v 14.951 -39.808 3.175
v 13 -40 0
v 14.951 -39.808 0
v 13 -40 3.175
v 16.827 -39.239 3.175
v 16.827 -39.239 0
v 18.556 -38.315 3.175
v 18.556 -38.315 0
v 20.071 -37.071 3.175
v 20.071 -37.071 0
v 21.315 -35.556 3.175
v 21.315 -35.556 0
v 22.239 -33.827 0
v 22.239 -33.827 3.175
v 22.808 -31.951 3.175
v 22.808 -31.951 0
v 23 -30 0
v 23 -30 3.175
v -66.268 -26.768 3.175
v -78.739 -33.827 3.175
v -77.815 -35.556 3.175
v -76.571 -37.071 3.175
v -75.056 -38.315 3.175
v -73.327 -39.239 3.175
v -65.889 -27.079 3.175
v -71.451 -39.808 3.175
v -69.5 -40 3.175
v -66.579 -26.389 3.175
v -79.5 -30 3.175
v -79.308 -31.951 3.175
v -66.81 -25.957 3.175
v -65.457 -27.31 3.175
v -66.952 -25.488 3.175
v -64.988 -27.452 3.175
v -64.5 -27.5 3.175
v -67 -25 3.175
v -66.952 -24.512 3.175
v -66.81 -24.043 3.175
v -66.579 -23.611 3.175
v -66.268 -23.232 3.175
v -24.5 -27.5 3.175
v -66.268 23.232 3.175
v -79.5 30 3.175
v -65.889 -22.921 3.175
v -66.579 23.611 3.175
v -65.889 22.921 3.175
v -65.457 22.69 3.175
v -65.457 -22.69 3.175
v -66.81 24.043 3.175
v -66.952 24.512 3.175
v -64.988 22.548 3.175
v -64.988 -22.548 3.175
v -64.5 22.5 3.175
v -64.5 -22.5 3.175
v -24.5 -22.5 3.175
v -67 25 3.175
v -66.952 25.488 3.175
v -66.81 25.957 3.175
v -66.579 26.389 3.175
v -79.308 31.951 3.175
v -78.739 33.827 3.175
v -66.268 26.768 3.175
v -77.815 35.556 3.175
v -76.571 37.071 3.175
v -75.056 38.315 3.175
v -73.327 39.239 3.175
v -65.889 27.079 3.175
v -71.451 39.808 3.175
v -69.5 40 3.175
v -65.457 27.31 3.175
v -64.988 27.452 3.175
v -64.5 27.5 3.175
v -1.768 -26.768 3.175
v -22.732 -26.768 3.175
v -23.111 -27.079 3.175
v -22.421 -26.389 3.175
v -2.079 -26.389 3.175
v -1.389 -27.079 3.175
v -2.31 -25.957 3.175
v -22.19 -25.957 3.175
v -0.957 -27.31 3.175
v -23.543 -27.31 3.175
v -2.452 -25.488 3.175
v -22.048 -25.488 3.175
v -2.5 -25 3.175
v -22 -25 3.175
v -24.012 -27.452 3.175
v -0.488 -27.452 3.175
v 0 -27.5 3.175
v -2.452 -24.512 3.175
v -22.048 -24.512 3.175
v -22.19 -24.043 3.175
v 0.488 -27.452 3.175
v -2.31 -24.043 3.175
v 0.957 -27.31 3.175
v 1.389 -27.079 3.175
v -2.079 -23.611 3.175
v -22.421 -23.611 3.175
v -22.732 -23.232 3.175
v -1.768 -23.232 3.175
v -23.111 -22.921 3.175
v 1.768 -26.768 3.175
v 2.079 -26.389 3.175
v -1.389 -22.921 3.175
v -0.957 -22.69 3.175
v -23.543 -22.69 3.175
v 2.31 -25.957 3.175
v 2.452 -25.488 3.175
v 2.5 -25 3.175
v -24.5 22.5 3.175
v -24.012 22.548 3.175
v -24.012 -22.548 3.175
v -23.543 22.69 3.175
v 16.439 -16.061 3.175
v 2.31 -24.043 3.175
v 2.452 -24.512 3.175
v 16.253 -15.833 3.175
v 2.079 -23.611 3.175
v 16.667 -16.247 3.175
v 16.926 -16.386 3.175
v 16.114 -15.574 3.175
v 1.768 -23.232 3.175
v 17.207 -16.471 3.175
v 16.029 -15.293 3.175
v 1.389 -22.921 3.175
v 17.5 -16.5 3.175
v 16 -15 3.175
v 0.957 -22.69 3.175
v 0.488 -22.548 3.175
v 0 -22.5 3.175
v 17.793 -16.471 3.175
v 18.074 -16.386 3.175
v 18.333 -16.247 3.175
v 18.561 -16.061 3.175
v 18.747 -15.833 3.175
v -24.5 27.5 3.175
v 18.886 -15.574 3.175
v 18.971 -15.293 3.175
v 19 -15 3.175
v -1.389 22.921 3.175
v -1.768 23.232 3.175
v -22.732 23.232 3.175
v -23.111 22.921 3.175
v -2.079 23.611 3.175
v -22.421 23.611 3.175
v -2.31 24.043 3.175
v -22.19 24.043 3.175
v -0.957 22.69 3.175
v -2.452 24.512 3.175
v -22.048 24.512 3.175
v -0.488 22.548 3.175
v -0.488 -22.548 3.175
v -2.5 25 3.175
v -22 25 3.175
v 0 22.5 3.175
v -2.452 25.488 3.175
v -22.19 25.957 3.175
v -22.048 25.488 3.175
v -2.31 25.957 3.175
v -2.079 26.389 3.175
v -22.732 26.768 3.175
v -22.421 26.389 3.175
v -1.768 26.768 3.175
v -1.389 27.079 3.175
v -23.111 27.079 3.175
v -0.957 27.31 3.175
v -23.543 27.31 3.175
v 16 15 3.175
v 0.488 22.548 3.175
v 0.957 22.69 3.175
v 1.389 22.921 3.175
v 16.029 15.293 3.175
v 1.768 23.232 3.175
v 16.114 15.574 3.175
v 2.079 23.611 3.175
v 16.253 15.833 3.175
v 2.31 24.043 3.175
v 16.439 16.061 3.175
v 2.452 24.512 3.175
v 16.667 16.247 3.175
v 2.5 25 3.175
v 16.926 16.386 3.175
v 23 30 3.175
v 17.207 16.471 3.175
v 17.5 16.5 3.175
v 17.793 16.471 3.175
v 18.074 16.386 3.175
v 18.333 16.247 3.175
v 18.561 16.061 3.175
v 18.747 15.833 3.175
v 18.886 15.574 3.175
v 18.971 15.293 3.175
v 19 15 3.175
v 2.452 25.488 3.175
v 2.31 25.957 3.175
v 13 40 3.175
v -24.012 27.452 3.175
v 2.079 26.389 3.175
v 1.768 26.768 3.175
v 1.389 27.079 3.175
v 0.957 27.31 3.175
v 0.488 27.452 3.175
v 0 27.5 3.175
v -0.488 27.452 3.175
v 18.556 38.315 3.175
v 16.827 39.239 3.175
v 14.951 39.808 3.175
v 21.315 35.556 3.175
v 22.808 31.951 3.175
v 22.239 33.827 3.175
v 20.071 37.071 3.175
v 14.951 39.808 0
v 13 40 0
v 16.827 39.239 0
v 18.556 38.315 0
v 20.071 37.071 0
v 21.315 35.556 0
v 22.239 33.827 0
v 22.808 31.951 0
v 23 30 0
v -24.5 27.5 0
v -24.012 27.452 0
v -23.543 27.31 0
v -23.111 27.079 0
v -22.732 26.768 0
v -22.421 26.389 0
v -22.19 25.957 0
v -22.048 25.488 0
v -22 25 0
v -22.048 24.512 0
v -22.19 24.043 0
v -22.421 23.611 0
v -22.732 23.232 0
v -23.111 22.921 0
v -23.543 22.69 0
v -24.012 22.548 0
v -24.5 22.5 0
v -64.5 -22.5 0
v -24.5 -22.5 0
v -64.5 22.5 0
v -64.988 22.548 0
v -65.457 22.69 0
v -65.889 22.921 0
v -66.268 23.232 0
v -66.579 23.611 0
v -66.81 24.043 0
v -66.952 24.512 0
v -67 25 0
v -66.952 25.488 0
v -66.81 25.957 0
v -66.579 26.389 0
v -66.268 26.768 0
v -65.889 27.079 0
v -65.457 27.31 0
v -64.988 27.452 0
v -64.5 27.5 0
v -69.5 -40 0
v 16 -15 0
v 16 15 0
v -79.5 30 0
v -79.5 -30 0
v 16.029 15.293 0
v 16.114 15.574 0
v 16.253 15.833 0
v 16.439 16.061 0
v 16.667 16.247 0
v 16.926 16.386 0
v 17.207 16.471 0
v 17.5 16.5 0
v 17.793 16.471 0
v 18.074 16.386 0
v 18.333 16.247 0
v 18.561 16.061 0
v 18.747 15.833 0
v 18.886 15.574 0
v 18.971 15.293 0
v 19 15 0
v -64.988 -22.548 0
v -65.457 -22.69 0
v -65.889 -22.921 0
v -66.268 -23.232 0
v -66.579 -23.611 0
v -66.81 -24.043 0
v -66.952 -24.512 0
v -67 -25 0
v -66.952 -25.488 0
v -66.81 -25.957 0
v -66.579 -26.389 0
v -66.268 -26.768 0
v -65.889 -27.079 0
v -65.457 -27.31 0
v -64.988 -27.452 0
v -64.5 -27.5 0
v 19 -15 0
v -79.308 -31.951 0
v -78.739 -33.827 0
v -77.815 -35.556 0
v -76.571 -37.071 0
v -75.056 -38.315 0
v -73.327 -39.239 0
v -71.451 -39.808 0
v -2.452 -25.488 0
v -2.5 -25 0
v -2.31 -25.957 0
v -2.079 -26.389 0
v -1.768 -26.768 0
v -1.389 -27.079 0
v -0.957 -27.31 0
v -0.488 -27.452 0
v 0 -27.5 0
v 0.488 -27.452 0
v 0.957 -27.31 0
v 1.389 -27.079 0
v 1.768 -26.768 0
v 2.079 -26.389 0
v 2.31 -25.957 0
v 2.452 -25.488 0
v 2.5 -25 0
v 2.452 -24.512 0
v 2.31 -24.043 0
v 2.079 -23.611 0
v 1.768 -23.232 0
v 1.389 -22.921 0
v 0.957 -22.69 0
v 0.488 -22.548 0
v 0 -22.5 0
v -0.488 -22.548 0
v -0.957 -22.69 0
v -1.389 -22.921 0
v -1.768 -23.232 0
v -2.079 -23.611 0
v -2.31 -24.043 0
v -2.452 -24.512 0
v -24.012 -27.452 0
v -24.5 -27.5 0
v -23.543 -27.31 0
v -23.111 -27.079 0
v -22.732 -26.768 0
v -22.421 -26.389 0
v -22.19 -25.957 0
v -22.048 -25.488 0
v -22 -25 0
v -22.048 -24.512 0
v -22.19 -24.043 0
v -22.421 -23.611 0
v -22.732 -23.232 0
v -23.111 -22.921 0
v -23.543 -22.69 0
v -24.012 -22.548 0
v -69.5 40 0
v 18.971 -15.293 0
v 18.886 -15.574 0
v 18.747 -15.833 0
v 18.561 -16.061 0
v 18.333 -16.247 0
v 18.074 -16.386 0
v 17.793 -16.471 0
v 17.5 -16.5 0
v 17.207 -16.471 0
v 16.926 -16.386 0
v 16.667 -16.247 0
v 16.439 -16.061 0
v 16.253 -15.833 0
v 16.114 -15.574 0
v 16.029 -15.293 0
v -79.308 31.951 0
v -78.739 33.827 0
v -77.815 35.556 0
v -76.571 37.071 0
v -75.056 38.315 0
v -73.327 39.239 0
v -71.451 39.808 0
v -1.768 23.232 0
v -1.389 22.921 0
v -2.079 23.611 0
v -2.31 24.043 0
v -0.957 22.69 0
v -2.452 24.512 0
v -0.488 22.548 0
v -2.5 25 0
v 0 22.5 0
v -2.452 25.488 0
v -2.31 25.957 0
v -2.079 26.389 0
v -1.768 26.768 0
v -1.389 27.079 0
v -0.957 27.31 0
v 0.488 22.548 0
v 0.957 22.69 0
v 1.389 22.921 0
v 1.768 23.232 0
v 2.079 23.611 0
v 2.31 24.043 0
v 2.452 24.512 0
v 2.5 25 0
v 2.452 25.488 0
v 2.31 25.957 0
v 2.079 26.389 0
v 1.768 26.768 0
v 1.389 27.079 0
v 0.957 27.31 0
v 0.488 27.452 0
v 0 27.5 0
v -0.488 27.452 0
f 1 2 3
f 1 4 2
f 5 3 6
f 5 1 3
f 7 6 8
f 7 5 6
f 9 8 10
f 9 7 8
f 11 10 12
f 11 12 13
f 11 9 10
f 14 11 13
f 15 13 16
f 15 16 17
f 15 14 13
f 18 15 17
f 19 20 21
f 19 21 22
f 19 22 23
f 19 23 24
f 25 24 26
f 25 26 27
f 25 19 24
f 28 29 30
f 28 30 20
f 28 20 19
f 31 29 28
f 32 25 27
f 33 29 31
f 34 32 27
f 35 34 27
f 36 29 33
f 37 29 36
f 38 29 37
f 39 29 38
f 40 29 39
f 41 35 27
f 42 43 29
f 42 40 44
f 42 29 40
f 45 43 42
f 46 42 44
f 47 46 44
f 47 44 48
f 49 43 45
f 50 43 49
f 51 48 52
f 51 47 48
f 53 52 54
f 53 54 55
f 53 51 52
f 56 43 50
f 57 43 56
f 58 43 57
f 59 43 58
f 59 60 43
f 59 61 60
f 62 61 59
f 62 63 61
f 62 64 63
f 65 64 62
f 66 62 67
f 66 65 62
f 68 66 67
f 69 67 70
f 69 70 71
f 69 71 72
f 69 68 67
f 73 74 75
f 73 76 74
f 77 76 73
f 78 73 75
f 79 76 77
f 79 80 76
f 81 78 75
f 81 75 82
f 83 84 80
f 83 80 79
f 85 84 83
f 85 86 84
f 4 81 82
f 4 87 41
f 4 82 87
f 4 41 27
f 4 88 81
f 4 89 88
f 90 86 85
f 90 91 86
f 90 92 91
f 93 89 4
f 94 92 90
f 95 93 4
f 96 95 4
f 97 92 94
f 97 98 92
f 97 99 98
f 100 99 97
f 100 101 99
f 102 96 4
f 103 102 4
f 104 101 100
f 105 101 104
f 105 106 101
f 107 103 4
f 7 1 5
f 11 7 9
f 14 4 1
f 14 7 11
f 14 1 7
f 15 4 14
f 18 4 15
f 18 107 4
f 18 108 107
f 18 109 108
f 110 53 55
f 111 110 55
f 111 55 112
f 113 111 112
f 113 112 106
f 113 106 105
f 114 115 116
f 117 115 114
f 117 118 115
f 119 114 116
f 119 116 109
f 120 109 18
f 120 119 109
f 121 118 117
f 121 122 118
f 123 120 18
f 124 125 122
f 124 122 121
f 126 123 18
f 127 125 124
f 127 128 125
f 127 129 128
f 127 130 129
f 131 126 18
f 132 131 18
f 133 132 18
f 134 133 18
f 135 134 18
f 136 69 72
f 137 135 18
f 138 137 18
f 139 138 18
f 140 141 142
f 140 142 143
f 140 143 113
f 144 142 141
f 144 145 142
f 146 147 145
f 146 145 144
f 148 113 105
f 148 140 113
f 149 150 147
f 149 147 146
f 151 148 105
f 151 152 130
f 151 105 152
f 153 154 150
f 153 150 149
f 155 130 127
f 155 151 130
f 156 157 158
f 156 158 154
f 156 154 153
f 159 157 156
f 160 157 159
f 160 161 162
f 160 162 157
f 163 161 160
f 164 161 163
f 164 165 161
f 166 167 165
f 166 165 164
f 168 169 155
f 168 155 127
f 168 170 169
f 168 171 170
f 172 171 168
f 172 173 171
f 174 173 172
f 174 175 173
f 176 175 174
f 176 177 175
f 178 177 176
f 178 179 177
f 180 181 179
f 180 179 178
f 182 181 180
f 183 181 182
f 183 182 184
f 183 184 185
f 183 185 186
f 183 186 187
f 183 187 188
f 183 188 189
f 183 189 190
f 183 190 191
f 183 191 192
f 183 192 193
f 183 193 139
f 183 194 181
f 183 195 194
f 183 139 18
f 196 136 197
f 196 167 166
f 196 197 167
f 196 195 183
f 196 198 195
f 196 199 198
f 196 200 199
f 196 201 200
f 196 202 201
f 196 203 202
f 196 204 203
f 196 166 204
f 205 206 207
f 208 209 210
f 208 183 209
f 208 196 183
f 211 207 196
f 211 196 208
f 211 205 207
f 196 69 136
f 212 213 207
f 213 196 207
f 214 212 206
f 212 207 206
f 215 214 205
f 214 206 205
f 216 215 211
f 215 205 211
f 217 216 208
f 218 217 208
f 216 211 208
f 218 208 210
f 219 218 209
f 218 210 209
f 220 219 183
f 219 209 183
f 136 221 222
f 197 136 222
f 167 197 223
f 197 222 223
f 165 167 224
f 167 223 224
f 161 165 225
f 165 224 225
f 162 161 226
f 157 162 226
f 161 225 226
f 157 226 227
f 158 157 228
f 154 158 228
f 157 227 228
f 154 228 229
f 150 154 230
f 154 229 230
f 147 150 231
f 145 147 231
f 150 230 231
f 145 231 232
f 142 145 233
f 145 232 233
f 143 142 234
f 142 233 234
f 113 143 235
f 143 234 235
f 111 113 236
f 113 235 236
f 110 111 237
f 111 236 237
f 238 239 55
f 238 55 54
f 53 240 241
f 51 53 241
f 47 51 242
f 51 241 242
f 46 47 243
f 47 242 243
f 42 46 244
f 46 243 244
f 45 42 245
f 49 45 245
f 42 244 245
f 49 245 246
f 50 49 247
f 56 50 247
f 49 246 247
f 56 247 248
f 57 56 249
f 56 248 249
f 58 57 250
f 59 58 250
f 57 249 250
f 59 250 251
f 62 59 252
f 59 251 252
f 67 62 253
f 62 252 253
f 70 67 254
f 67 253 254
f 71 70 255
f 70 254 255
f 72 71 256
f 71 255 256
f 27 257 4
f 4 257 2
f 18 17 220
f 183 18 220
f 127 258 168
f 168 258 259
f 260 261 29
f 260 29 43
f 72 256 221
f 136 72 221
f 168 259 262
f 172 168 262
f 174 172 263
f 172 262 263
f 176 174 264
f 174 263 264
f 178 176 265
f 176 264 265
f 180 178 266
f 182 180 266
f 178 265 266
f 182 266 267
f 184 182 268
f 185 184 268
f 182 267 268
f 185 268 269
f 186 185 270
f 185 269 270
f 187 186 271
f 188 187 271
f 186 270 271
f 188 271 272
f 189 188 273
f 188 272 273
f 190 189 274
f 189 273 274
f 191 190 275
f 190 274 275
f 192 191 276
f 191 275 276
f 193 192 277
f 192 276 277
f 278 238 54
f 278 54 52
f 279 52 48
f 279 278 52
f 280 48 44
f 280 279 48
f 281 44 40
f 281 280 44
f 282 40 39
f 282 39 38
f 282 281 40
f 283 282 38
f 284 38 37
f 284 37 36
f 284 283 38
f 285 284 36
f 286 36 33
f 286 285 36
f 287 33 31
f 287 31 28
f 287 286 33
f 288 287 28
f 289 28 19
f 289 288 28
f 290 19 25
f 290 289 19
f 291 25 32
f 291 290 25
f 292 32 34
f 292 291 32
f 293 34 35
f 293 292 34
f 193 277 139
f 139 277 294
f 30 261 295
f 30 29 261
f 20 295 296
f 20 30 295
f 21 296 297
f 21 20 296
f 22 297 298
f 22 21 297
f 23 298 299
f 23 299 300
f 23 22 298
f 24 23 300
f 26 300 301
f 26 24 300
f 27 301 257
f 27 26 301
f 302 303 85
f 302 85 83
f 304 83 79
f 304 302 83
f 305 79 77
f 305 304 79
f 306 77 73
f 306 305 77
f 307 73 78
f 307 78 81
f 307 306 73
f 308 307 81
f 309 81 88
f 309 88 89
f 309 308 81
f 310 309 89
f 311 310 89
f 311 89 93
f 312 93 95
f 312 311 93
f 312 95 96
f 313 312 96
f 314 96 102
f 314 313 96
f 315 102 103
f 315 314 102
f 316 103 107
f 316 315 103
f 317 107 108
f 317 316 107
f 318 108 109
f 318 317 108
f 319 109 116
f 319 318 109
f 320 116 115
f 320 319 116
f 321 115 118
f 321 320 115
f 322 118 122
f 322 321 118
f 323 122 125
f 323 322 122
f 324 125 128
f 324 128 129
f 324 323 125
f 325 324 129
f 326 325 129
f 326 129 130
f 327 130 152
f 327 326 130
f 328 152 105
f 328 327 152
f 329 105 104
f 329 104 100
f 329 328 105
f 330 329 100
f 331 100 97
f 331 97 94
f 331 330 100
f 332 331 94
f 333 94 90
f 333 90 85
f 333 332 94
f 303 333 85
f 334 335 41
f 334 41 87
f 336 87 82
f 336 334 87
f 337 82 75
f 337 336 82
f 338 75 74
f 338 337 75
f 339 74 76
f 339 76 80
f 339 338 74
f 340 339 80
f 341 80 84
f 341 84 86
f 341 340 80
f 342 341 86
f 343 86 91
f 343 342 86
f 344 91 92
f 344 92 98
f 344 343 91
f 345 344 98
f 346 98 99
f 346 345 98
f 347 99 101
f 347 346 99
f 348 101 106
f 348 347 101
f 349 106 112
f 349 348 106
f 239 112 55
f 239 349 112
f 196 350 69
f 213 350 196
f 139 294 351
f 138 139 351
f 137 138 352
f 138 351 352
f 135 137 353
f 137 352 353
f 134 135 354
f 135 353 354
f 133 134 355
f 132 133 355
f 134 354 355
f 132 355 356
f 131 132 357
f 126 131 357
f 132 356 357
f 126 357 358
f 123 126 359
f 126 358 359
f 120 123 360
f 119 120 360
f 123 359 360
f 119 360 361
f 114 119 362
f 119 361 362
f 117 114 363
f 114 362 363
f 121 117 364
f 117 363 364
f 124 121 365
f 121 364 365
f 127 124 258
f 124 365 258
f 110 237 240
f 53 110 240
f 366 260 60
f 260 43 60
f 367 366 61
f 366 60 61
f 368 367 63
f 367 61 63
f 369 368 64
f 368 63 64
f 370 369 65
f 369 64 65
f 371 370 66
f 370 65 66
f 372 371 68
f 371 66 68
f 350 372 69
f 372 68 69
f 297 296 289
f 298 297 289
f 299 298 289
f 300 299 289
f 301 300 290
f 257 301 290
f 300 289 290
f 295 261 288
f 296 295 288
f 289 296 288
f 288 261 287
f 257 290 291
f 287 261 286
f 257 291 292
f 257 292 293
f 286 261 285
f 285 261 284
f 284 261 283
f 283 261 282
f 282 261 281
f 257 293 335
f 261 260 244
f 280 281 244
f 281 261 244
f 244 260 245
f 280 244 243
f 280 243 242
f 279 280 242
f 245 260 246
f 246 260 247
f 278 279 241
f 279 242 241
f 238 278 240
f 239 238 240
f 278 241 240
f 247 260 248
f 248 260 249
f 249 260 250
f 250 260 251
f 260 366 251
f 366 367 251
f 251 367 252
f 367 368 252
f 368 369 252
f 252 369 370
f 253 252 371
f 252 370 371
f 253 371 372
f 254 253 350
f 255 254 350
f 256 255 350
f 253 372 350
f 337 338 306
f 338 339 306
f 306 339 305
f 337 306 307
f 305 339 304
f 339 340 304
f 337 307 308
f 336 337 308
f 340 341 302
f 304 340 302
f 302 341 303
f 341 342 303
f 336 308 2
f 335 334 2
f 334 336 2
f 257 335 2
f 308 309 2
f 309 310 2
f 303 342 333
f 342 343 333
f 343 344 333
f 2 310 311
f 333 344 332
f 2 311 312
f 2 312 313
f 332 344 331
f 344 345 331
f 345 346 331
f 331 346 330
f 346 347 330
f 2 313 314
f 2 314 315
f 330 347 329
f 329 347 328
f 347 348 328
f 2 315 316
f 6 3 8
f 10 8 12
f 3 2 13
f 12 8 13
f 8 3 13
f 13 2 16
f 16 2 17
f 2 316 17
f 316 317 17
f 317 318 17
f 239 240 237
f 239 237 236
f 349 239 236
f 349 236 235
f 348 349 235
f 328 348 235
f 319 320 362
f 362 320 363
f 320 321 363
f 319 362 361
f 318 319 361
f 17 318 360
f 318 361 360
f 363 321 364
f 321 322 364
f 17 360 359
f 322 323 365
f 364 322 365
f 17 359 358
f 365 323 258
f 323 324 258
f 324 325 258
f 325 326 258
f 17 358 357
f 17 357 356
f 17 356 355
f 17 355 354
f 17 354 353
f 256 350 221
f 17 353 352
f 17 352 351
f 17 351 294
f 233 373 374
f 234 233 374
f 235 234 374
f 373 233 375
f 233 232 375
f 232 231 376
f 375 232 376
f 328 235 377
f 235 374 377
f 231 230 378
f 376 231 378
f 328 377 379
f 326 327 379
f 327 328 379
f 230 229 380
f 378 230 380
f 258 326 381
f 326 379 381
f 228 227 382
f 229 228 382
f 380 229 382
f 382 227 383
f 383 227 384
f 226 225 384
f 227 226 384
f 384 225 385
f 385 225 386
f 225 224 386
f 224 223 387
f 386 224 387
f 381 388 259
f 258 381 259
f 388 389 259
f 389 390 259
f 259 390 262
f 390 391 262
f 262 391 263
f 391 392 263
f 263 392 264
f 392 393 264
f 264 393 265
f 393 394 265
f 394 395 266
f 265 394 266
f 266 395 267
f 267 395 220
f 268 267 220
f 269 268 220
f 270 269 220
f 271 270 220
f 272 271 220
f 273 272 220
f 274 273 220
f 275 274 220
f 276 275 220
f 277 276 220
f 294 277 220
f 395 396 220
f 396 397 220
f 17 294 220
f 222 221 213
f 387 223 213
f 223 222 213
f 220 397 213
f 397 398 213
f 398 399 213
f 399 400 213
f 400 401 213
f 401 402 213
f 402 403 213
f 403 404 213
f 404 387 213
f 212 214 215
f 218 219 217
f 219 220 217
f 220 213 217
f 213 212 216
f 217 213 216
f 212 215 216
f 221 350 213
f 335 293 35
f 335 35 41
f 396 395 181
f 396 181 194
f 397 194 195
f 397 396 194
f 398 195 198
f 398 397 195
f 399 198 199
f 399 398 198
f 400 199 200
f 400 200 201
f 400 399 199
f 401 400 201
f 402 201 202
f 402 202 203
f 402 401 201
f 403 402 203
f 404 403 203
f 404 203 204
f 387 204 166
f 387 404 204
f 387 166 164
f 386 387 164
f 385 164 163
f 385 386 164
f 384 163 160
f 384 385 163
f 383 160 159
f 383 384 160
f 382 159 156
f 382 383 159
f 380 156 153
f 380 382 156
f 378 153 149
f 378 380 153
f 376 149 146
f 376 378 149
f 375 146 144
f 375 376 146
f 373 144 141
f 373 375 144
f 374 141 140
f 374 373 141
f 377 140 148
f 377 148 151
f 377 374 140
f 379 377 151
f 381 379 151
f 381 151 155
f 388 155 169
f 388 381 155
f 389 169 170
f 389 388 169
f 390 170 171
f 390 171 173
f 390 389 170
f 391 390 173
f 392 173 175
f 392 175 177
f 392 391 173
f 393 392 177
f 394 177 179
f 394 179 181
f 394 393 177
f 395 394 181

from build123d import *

# Parameters (mm, degrees)
SKETCH1_W           = 102.5
SKETCH1_H           = 80
SKETCH1_R           = 2.5
BOSS_EXTRUDE1_DEPTH = 3.175
FILLET1_R           = 10


with BuildPart() as part:
    # Sketch1 → Boss-Extrude1 (new body)
    with BuildSketch(Plane.XY):
        with Locations((-28.25, 0)):
            Rectangle(SKETCH1_W, SKETCH1_H)
        with Locations((0, 25)):
            Circle(SKETCH1_R, mode=Mode.SUBTRACT)
        with Locations(Location((0, -25, 0), (0, 0, 180))):
            Circle(SKETCH1_R, mode=Mode.SUBTRACT)
        with BuildLine():
            Line((-64.5, -27.5), (-24.5, -27.5))
            ThreePointArc((-24.5, -27.5), (-22, -25), (-24.5, -22.5))
            Line((-24.5, -22.5), (-64.5, -22.5))
            ThreePointArc((-64.5, -22.5), (-67, -25), (-64.5, -27.5))
        make_face(mode=Mode.SUBTRACT)
        with BuildLine():
            Line((-64.5, 27.5), (-24.5, 27.5))
            ThreePointArc((-24.5, 27.5), (-22, 25), (-24.5, 22.5))
            Line((-24.5, 22.5), (-64.5, 22.5))
            ThreePointArc((-64.5, 22.5), (-67, 25), (-64.5, 27.5))
        make_face(mode=Mode.SUBTRACT)
        with BuildLine():
            Line((19, 15), (19, -15))
            ThreePointArc((19, -15), (17.5, -16.5), (16, -15))
            Line((16, -15), (16, 15))
            ThreePointArc((16, 15), (17.5, 16.5), (19, 15))
        make_face(mode=Mode.SUBTRACT)
    extrude(amount=BOSS_EXTRUDE1_DEPTH)

    # Fillet1
    fillet1_edges = [part.edges().sort_by_distance(p)[0] for p in [
        (23, -40, 1.5875),
        (-79.5, -40, 1.5875),
        (-79.5, 40, 1.5875),
        (23, 40, 1.5875),
    ]]
    fillet(fillet1_edges, radius=FILLET1_R)


solid = part.part
